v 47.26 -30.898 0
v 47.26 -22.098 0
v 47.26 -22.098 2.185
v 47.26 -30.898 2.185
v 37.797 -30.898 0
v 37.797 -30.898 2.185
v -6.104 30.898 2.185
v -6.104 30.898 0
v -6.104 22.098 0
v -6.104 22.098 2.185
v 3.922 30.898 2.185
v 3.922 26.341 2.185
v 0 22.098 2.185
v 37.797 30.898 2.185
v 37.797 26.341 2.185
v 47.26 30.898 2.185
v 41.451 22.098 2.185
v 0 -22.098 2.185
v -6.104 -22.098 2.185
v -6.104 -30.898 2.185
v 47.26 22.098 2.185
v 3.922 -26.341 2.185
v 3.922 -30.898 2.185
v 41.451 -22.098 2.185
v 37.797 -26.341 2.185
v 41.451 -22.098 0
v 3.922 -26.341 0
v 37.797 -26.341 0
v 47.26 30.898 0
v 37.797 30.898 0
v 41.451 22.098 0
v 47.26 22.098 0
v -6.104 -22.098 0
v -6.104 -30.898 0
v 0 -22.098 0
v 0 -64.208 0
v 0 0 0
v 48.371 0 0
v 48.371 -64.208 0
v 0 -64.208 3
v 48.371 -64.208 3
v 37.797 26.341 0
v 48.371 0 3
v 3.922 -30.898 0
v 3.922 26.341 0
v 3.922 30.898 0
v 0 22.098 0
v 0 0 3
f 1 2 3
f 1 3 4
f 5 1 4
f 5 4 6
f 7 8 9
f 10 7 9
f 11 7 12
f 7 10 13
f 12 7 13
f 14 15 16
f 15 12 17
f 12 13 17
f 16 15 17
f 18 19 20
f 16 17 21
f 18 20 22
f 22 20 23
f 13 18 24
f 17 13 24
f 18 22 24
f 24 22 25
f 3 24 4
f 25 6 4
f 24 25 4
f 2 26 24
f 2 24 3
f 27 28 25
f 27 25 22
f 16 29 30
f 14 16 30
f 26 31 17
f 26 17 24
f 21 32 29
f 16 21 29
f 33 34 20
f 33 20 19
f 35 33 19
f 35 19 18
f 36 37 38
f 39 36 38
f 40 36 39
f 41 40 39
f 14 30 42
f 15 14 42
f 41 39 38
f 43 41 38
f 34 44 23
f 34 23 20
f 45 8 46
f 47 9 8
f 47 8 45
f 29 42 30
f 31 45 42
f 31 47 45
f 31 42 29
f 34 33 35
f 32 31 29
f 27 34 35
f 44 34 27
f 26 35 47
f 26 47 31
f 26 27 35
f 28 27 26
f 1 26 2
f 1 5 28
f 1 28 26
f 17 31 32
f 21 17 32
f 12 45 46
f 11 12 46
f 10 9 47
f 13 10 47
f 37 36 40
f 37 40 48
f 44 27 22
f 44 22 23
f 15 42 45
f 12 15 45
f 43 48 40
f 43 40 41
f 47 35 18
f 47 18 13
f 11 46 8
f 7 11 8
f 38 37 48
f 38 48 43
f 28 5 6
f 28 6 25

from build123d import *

# Parameters (mm, degrees)
F0_W     = 48.3713261783
F0_H     = 64.2076134682
F1_DEPTH = 3
F0_W_2   = 12.6881040633
F0_H_2   = 12.7290943637
F4_W     = 3.9221420884
F4_H     = 4.2427778244
F4_W_2   = 3.6538615823
F5_DEPTH = 2.1847370081


with BuildPart() as f1:
    # F0 (on Top) → F1 (new body)
    with BuildSketch(Plane.XY):
        with Locations((24.1856630892, -32.1038067341)):
            Rectangle(F0_W, F0_H)
    extrude(amount=F1_DEPTH)


with BuildPart() as f1b:
    # F0 (on Top) → F1, piece 2 (new body)
    with BuildSketch(Plane.XY):
        Polygon((60.9453171492, -64.2076134682), (48.3713261783, -64.2076134682), (48.8873720169, -77.1873742342), (60.9453171492, -77.1873742342), align=None)
    extrude(amount=F1_DEPTH)


with BuildPart() as f1c:
    # F0 (on Top) → F1, piece 3 (new body)
    with BuildSketch(Plane.XY):
        with Locations((54.7153782099, 6.3645471819)):
            Rectangle(F0_W_2, F0_H_2)
    extrude(amount=F1_DEPTH)


with BuildPart() as f5:
    # F4 (on Top) → F5 (new body)
    with BuildSketch(Plane.XY):
        Polygon((0, 22.0977440476), (0, 0), (41.4505898952, 0), (41.4505898952, 22.0977440476), (37.796728313, 22.0977440476), (37.796728313, 26.340521872), (3.9221420884, 26.340521872), (3.9221420884, 22.0977440476), align=None)
        Polygon((-6.1037912965, 22.0977440476), (0, 22.0977440476), (0, 26.340521872), (3.9221420884, 26.340521872), (3.9221420884, 30.8983102441), (-6.1037912965, 30.8983102441), align=None)
        with Locations((1.9610710442, 24.2191329598)):
            Rectangle(F4_W, F4_H)
        with Locations((39.6236591041, 24.2191329598)):
            Rectangle(F4_W_2, F4_H)
        Polygon((41.4505898952, 26.340521872), (41.4505898952, 22.0977440476), (47.2597032785, 22.0977440476), (47.2597032785, 30.8983102441), (37.796728313, 30.8983102441), (37.796728313, 26.340521872), align=None)
    extrude(amount=F5_DEPTH)

    # F8: F5 across plane


with BuildPart() as f5_1:
    add(f5.part)
    add(f5.part.mirror(Plane.XZ))


solid = Compound([f1.part, f5_1.part])
